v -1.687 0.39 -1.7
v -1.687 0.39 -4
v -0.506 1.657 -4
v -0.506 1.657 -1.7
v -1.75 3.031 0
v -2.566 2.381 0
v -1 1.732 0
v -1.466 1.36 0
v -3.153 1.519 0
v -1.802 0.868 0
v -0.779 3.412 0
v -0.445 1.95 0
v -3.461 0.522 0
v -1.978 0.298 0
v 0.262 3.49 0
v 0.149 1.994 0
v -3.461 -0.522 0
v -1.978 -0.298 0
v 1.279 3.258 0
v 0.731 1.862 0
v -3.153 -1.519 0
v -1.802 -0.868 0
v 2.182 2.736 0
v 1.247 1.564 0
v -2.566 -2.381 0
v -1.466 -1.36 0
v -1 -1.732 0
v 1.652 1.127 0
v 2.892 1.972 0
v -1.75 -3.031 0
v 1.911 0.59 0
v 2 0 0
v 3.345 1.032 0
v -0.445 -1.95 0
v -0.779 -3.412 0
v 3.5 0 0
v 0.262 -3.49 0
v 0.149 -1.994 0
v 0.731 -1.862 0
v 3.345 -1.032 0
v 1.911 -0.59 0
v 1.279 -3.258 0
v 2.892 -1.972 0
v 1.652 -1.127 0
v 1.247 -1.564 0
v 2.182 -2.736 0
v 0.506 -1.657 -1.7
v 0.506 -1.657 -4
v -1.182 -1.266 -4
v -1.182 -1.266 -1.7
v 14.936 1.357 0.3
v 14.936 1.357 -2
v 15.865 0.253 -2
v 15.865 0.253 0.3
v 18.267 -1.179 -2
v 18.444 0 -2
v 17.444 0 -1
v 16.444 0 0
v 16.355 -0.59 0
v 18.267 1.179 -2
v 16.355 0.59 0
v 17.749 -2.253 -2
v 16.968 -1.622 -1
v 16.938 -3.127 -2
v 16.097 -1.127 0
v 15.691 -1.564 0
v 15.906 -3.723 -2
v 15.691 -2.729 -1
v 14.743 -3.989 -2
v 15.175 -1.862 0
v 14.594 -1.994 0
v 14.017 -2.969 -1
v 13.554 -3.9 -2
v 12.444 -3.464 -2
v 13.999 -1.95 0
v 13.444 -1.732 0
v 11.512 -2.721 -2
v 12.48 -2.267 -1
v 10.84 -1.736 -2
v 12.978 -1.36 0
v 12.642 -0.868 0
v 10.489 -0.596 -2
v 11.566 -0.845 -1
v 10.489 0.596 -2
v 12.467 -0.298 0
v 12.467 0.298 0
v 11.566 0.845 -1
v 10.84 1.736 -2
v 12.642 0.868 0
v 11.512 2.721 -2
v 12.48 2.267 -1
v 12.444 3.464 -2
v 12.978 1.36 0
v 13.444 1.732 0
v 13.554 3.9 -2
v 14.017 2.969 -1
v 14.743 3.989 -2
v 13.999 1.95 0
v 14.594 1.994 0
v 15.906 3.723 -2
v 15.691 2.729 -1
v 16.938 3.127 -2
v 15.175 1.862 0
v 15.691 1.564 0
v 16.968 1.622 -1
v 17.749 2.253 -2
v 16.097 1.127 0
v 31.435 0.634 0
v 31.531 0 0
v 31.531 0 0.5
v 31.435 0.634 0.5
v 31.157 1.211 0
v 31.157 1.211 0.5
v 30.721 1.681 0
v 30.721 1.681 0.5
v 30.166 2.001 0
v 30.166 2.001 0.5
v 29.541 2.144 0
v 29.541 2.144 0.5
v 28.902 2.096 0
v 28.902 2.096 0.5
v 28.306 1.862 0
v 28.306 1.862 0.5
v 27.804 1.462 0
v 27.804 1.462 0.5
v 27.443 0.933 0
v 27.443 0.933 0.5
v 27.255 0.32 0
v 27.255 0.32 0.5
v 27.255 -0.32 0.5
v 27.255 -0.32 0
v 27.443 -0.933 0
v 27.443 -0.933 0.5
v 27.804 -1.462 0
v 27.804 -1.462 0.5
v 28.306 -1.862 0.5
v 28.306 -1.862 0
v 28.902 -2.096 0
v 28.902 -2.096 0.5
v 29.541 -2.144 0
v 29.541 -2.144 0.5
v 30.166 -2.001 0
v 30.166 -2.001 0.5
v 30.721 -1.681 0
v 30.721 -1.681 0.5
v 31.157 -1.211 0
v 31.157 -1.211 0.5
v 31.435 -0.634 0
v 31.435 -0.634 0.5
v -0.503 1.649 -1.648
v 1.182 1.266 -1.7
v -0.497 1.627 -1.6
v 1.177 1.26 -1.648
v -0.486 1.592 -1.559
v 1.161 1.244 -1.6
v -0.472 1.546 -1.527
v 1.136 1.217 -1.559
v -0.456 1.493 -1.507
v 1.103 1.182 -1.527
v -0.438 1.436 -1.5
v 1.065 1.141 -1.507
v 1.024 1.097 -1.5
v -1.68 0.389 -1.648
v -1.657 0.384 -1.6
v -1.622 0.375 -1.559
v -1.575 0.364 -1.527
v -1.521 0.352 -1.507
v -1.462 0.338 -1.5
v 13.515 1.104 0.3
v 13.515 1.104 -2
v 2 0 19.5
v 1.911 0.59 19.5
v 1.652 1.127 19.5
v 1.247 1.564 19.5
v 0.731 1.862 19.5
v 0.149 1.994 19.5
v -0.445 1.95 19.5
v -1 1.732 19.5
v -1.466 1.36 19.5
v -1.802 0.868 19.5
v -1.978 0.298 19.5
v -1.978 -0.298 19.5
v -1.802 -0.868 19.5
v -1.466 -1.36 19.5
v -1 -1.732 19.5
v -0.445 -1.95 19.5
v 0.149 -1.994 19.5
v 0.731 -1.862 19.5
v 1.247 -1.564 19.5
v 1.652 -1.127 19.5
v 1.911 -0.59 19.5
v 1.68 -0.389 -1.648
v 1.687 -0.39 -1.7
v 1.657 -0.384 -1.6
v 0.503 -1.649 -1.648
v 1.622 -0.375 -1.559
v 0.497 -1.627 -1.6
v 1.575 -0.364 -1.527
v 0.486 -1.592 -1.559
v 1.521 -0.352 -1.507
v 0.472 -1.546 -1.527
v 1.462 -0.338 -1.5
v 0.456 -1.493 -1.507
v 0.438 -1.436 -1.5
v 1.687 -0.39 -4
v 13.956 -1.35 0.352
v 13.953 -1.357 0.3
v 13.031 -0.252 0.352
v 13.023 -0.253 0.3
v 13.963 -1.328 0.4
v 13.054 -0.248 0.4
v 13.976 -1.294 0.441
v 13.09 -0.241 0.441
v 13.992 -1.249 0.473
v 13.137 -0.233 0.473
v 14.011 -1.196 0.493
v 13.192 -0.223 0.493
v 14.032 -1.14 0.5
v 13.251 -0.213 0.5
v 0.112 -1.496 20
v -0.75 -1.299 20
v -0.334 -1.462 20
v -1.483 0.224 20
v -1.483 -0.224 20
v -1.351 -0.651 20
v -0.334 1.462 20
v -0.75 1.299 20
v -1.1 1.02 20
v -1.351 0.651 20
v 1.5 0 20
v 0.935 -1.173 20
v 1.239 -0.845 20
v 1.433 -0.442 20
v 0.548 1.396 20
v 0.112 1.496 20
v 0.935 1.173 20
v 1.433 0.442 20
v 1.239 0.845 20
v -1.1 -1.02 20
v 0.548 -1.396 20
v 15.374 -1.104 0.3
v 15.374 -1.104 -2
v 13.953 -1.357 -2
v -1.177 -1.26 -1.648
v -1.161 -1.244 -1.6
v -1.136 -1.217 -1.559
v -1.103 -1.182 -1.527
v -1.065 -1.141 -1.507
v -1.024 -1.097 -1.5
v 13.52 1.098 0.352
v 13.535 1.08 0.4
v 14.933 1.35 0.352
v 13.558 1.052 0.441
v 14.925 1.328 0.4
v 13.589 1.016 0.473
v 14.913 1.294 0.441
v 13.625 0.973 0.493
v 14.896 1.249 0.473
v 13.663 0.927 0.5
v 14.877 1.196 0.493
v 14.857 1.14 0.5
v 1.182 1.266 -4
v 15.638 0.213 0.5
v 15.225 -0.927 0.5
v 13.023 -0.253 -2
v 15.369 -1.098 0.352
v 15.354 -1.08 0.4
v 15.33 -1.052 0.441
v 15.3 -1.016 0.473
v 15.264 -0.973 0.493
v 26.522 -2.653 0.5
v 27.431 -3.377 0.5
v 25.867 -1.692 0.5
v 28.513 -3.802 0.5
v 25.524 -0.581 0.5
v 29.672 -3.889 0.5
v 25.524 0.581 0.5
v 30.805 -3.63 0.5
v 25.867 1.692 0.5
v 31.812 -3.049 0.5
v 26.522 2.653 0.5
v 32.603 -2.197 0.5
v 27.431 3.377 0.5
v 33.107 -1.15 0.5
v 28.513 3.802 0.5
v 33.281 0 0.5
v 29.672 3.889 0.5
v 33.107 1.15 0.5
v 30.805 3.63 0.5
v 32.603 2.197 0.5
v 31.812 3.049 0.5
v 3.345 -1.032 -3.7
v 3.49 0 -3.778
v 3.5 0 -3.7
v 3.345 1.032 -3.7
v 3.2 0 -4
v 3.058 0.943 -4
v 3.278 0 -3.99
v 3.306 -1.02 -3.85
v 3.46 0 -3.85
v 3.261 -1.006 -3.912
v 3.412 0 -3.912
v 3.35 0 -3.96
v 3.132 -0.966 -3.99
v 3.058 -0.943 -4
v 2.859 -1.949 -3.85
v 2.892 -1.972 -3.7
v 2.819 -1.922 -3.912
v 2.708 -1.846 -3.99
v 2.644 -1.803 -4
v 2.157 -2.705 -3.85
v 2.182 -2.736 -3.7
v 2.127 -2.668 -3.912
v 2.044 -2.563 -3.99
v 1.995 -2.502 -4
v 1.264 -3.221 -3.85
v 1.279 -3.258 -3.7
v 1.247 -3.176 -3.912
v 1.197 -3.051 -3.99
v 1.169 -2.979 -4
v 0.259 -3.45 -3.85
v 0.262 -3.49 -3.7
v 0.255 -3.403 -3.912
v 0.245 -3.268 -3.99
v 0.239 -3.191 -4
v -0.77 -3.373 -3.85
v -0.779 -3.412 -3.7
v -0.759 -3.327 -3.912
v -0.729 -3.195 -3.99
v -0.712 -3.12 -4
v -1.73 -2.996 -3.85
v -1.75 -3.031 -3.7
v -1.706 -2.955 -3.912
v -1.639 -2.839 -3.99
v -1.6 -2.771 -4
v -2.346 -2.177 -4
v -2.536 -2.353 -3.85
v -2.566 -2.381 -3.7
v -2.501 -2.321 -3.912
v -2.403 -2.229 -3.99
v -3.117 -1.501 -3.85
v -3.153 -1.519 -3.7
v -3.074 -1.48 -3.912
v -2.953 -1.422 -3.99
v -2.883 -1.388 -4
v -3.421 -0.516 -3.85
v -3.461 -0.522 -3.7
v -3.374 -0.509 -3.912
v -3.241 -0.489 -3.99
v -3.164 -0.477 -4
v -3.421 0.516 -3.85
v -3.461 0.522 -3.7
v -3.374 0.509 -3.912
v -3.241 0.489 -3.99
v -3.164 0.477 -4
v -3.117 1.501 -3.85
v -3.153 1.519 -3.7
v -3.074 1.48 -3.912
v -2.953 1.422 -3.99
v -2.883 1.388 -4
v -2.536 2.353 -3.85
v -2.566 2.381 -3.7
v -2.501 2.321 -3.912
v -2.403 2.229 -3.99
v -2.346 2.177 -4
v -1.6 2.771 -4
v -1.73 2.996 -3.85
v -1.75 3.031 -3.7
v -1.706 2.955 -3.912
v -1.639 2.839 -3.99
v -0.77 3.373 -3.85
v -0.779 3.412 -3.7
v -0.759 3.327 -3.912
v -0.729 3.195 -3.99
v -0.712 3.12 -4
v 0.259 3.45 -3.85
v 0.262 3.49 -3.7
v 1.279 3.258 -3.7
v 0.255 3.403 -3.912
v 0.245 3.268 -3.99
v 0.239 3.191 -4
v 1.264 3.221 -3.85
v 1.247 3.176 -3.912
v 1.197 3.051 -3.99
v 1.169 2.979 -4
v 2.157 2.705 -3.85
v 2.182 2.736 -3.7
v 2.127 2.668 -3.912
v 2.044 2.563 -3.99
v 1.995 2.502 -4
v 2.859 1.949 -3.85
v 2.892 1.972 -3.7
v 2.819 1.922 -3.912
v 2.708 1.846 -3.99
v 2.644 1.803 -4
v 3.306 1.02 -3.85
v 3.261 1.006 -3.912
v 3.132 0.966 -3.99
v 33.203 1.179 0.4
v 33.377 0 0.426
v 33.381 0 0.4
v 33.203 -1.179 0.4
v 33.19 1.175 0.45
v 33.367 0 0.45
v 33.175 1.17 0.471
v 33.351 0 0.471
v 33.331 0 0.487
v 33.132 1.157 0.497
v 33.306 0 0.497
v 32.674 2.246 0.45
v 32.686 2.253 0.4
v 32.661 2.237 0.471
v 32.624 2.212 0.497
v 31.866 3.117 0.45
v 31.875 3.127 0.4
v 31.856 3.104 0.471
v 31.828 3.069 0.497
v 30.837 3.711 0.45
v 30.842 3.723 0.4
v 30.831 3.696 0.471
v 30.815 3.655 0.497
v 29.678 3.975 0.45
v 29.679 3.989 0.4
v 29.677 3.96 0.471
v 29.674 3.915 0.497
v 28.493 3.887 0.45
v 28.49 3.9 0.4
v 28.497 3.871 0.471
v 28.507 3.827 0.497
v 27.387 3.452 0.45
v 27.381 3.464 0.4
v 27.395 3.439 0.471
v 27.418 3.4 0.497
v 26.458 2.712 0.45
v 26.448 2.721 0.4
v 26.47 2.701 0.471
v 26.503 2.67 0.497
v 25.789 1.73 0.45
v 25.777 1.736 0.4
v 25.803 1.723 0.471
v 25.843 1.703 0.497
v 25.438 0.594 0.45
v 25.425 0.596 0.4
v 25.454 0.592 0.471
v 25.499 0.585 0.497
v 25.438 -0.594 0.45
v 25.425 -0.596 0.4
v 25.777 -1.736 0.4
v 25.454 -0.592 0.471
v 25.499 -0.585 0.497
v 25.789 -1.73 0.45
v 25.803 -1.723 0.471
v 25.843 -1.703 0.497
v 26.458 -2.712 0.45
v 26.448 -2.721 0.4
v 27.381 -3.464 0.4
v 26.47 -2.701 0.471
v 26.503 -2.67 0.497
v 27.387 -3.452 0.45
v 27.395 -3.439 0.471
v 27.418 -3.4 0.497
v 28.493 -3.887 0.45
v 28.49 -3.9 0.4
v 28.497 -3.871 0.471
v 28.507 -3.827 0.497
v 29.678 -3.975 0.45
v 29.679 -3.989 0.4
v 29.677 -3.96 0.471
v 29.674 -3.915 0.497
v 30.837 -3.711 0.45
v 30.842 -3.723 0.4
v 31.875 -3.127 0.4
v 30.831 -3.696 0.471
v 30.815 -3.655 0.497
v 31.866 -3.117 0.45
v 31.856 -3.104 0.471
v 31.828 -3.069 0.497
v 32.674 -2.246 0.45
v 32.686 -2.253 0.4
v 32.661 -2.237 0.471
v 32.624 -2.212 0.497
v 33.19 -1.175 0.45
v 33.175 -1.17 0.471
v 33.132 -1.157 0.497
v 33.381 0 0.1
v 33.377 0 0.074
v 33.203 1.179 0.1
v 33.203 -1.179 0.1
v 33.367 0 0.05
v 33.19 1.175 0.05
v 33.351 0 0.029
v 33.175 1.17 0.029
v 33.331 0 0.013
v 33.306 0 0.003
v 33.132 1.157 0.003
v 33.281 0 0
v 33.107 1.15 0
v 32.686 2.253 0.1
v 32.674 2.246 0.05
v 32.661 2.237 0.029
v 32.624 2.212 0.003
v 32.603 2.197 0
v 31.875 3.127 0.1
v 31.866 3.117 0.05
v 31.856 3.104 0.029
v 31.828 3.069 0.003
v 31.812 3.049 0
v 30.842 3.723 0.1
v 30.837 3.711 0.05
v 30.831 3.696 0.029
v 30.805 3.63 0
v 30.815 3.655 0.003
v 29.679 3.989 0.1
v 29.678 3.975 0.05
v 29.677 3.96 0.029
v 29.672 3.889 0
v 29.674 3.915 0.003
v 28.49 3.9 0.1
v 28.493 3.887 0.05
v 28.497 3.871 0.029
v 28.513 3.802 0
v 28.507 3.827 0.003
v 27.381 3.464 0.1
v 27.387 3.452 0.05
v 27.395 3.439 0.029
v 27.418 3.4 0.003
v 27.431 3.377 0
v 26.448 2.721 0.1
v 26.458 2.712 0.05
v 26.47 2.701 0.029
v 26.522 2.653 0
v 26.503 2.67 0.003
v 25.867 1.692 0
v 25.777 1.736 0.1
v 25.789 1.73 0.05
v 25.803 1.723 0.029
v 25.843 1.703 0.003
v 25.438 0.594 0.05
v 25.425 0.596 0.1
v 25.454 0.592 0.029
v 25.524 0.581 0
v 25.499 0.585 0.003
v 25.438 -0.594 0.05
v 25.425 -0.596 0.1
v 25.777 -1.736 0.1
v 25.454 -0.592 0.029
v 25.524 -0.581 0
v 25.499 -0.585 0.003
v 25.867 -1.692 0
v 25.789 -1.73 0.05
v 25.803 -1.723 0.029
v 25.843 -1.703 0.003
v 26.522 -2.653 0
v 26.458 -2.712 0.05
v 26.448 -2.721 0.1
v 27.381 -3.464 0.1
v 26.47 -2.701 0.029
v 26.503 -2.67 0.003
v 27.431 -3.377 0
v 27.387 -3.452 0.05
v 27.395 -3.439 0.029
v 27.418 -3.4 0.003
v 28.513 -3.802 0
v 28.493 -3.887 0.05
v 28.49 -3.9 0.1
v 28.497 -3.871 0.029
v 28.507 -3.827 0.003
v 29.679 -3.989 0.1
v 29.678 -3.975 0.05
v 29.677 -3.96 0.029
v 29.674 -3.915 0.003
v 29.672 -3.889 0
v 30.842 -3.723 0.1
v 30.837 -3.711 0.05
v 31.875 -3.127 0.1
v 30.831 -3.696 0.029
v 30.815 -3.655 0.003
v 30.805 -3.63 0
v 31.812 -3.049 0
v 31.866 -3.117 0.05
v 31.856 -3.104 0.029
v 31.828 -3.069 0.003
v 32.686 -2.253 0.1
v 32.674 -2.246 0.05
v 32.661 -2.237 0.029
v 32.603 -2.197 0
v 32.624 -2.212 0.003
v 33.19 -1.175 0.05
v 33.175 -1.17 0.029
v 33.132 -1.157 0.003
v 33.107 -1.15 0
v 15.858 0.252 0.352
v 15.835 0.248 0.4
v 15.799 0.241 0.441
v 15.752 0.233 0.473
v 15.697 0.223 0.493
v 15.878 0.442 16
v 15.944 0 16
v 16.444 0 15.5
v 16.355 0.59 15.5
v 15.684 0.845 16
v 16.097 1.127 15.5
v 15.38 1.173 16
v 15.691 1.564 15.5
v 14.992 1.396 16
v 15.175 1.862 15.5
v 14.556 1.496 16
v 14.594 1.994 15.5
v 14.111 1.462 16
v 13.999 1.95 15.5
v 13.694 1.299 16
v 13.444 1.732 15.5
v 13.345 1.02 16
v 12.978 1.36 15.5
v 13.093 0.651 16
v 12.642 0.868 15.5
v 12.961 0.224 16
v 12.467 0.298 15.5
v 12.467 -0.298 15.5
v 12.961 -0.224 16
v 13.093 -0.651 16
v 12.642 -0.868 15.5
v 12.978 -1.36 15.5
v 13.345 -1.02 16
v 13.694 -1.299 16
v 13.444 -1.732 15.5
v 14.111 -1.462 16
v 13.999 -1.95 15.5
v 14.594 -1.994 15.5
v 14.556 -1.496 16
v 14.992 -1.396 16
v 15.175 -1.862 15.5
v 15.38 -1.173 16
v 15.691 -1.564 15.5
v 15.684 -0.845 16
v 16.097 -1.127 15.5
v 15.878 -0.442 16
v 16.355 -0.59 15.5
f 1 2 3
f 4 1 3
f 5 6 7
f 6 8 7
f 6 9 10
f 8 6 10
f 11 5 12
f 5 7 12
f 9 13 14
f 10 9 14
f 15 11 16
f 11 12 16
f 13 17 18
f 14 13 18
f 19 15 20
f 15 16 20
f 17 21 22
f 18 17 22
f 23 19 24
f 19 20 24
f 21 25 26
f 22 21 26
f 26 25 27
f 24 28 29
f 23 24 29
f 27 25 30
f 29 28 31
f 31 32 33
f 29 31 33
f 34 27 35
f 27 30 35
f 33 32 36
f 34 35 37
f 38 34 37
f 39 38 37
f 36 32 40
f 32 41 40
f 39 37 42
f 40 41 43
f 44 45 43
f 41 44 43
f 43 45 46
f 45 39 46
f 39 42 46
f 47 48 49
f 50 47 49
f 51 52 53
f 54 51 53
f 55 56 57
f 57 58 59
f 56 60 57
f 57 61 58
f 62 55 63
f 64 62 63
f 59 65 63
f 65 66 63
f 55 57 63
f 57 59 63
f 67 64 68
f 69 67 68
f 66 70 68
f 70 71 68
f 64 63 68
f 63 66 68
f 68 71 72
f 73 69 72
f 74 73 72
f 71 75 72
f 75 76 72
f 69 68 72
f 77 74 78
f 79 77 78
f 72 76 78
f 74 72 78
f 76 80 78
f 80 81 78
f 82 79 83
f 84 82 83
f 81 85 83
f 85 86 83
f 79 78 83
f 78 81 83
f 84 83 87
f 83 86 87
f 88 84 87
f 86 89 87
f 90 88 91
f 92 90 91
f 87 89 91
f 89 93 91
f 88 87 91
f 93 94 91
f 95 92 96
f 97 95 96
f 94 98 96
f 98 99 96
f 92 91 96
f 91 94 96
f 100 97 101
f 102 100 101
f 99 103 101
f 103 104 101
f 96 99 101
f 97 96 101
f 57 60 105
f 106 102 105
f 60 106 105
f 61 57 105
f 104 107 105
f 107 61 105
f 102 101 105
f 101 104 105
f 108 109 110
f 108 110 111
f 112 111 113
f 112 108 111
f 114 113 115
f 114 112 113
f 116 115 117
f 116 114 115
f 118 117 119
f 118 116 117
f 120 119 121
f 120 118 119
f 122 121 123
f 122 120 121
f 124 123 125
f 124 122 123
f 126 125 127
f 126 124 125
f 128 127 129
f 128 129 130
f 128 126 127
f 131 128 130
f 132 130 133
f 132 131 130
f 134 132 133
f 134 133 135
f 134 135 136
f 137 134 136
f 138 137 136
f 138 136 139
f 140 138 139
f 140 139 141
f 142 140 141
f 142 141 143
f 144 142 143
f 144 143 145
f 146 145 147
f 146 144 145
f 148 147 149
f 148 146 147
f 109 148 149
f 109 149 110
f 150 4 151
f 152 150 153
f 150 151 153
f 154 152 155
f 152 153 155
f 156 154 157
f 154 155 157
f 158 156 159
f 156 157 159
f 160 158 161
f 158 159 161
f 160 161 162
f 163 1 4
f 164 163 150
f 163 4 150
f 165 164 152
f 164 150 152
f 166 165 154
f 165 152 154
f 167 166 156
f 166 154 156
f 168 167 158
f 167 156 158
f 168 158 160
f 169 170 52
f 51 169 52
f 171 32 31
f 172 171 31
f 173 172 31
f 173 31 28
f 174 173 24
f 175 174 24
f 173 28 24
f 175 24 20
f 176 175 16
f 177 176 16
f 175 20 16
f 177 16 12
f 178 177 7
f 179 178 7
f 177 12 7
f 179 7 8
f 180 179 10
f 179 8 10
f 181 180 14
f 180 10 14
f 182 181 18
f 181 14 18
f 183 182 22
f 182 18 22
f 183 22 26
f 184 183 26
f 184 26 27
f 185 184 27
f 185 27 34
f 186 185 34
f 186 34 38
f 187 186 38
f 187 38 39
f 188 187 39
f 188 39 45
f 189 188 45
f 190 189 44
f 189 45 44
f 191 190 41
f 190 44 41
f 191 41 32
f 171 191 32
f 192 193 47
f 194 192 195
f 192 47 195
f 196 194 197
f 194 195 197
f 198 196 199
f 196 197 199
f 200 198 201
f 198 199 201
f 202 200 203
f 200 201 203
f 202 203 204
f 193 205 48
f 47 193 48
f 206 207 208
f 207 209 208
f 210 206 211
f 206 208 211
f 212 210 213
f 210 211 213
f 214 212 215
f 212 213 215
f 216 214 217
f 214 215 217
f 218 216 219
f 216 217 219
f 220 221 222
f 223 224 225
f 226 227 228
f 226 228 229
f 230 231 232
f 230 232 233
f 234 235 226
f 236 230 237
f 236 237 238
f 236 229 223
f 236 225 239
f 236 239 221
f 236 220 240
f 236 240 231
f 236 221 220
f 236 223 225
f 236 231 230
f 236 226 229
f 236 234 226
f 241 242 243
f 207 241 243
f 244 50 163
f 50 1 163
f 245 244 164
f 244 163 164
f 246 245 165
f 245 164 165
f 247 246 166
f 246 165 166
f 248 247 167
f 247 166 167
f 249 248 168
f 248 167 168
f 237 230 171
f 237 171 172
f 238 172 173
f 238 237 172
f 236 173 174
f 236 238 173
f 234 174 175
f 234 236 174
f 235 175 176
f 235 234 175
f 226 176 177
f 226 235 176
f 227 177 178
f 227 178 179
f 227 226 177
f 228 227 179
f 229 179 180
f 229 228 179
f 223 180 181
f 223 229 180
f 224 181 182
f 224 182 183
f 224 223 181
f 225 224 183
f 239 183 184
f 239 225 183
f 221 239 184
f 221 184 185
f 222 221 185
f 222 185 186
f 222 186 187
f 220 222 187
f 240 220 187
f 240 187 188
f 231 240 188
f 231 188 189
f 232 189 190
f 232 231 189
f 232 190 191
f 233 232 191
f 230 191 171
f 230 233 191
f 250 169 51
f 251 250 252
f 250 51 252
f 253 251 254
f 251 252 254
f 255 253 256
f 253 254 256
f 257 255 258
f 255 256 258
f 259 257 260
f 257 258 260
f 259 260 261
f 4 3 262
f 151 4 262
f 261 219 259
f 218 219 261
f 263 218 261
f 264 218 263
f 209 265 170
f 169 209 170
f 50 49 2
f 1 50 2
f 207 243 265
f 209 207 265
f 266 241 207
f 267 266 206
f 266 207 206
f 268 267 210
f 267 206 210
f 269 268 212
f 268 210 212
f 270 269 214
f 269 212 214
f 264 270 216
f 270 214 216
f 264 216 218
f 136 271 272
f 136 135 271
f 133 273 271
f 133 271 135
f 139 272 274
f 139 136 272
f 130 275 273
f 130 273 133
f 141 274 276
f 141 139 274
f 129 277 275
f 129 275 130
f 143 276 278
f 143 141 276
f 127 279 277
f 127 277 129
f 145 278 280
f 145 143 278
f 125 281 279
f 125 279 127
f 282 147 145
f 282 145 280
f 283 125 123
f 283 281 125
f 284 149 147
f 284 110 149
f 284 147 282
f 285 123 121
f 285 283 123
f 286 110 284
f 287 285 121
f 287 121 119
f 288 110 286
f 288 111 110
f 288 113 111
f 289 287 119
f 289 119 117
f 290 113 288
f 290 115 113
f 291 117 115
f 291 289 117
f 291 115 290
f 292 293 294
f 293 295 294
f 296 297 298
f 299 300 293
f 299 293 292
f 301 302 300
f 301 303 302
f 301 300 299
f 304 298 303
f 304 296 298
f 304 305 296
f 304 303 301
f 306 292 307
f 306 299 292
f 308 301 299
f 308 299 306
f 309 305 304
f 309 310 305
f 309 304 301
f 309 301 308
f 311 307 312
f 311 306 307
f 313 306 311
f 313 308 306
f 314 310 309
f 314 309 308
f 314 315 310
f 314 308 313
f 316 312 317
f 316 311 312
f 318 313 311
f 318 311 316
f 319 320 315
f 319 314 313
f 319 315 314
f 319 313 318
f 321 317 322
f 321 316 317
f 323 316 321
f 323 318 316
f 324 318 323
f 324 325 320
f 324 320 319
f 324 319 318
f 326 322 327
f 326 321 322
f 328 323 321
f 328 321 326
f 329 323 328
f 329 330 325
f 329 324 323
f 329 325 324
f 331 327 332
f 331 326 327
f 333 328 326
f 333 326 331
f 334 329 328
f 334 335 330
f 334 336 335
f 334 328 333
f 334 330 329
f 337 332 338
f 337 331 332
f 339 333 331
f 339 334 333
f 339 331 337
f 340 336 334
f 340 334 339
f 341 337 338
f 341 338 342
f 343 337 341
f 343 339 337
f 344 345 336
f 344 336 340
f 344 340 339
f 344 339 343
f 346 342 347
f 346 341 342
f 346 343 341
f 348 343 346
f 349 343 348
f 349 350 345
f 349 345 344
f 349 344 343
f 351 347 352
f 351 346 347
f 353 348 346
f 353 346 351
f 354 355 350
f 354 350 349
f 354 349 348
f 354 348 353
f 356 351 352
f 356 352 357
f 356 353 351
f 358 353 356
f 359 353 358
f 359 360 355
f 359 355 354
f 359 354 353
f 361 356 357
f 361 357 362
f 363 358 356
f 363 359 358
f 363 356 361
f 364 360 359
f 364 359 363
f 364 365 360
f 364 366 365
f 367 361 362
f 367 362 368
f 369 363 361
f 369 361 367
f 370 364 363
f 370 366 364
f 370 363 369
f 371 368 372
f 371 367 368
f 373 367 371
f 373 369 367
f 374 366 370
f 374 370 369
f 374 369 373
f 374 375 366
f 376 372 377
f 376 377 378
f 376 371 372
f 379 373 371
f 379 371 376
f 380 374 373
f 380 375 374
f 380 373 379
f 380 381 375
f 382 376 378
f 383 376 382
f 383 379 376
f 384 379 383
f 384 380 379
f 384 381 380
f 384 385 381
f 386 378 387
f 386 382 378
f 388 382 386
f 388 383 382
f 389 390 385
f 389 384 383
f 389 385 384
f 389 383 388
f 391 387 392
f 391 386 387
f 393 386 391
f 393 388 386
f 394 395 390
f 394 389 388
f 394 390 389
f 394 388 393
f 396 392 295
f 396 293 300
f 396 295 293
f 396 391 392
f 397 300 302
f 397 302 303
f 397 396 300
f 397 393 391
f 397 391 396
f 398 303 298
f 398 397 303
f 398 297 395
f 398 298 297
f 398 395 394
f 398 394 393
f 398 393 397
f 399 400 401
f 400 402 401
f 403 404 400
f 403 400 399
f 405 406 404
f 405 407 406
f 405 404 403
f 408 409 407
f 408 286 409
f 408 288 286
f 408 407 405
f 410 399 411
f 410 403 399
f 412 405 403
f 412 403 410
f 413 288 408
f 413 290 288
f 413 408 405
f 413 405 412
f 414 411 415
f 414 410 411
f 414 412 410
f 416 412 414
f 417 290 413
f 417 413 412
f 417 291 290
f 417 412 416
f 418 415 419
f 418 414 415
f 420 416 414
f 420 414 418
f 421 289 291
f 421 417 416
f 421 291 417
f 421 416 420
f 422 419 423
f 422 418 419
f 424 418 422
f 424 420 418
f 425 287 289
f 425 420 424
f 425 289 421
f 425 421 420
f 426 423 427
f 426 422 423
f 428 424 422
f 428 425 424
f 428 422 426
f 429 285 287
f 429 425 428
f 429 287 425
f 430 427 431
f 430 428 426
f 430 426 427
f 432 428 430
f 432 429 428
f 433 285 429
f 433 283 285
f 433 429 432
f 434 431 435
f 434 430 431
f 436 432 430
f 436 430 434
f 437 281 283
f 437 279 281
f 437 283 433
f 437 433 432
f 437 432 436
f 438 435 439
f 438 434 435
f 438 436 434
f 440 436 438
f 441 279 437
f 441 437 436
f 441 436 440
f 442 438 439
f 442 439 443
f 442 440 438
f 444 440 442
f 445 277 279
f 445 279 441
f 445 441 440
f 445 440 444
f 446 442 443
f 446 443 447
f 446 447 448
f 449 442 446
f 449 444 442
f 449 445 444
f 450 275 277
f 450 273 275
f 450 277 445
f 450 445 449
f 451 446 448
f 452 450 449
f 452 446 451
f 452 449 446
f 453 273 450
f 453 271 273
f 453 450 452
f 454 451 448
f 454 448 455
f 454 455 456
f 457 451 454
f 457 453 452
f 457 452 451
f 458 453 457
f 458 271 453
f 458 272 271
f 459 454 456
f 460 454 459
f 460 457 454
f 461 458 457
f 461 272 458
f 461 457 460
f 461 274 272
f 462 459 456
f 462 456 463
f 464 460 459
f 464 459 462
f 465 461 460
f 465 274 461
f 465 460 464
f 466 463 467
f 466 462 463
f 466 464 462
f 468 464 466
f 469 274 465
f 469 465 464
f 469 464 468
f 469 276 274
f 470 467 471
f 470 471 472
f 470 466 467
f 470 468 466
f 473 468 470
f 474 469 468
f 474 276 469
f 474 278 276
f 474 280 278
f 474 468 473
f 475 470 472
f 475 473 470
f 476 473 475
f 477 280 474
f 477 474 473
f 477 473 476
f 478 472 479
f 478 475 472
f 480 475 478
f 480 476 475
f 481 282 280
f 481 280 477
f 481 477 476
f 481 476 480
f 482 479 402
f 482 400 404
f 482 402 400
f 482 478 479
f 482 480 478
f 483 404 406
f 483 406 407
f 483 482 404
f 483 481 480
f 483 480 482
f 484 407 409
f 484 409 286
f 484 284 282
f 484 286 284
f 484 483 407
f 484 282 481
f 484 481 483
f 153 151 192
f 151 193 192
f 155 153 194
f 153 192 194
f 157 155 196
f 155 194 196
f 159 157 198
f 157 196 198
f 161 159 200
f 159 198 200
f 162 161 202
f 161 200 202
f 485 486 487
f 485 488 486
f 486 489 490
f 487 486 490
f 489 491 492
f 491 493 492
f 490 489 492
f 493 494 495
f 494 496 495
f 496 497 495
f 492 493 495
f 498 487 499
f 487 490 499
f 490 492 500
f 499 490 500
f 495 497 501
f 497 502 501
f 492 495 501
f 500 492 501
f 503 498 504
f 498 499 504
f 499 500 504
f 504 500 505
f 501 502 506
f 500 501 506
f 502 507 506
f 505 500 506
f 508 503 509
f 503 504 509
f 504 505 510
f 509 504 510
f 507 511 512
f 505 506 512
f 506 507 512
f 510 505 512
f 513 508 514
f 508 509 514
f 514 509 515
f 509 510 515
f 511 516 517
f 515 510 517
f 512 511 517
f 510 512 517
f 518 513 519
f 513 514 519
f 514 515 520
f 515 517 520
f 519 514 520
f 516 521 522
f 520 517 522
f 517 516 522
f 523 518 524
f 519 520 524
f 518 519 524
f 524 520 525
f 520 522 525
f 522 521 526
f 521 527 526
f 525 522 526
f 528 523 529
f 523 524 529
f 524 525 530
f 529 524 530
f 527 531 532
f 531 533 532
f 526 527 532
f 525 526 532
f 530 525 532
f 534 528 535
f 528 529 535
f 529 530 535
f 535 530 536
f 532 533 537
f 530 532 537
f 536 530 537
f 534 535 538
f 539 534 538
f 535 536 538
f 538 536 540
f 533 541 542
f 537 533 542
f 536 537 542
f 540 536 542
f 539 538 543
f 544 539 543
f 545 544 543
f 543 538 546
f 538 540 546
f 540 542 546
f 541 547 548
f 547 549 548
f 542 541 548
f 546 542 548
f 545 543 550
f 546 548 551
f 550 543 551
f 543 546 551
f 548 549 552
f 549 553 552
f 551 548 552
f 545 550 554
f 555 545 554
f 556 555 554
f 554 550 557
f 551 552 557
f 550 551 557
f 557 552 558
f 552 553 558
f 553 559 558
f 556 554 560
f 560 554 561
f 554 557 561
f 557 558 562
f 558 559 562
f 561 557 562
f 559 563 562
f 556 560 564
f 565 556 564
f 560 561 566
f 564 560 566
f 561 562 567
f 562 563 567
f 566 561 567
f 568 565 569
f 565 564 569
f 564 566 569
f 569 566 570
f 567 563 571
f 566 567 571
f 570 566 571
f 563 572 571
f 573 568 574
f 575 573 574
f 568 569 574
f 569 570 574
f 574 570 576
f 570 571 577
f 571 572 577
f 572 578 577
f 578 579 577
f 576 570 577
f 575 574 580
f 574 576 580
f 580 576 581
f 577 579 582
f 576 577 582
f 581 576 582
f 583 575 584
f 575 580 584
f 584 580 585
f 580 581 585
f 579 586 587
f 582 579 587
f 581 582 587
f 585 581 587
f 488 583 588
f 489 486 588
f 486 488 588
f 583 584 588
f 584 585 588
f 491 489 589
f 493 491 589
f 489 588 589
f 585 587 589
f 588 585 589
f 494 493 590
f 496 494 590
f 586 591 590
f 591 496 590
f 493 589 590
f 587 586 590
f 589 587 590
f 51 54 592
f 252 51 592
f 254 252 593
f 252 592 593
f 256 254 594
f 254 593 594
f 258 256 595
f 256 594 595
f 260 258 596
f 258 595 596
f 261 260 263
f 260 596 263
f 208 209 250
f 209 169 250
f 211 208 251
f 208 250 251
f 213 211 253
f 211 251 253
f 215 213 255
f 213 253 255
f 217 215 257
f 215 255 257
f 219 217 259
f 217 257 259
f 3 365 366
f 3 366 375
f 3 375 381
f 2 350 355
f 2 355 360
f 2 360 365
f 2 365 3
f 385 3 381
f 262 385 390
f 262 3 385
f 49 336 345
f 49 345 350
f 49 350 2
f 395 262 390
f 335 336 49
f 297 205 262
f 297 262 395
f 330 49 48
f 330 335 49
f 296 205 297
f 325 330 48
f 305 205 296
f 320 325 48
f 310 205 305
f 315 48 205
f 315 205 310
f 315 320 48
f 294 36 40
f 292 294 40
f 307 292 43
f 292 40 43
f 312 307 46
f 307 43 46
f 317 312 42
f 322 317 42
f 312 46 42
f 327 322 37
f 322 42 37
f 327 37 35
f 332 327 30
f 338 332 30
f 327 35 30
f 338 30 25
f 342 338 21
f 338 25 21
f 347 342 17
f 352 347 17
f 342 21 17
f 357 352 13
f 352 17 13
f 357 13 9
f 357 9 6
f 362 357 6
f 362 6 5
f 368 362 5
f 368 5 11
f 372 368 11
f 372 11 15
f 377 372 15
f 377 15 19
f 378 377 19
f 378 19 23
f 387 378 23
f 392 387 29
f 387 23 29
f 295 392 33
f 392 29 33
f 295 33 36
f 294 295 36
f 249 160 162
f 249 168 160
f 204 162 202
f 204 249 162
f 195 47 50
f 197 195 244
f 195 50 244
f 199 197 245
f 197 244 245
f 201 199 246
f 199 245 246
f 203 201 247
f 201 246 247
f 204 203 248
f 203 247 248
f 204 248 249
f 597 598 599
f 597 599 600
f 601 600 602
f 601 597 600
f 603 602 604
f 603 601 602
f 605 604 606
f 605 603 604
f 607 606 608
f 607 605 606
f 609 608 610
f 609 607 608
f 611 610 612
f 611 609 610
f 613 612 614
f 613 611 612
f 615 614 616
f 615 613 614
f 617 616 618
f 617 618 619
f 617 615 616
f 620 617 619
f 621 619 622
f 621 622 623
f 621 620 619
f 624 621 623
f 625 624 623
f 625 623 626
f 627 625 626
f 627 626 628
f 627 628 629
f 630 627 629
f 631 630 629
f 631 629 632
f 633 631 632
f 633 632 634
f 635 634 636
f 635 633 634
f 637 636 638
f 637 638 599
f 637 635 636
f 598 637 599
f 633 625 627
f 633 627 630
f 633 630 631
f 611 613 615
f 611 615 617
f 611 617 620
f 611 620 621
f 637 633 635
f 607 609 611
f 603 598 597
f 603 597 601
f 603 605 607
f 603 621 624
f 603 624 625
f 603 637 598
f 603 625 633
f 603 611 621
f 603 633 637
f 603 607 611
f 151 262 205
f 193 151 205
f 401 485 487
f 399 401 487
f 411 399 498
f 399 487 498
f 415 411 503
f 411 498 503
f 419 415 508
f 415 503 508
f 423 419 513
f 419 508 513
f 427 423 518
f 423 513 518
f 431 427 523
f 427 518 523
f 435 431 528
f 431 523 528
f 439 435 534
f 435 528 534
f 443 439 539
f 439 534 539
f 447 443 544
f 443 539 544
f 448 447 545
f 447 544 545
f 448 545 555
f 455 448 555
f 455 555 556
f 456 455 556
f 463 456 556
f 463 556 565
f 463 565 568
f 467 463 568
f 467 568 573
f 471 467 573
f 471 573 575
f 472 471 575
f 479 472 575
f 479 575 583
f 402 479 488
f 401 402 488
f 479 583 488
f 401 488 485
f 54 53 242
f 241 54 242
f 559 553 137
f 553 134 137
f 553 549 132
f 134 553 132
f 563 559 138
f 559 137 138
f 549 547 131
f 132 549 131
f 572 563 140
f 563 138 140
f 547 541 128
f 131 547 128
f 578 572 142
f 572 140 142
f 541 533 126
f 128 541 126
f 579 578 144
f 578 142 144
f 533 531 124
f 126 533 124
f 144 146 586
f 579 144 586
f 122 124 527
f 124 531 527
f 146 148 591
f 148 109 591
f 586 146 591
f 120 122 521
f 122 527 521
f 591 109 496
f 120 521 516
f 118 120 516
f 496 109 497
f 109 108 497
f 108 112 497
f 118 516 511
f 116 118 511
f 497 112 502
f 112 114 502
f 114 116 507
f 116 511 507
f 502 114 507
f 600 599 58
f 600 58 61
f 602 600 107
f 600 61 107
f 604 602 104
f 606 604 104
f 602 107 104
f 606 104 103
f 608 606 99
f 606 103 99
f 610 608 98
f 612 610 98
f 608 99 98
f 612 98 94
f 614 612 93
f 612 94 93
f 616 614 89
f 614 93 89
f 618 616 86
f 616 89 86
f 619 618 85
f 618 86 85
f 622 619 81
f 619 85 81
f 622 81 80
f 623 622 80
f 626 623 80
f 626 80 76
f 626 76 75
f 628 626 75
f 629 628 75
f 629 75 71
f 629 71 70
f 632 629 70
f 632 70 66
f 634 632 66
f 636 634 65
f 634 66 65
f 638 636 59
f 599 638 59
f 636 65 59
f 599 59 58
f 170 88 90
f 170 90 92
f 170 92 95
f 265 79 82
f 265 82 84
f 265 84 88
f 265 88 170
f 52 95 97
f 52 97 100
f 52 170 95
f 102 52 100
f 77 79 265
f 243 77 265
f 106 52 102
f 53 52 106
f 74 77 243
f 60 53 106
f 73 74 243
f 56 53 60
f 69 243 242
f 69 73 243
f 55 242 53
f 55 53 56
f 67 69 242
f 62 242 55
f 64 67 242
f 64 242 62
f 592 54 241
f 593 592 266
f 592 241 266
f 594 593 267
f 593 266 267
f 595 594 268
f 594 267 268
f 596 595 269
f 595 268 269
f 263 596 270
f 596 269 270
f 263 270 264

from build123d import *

# Parameters (mm, degrees)
F0_R      = 2
F1_DEPTH  = 20
F2_SIZE   = 0.5
F3_R      = 3.5
F4_DEPTH  = 4
F5_R      = 0.3
F7_DEPTH  = 2.5
F8_R      = 0.2
F9_R      = 2
F10_DEPTH = 16
F11_SIZE  = 0.5
F12_R     = 4
F13_DEPTH = 2
F15_DEPTH = 2.5
F16_R     = 0.2
F17_SIZE  = 1.99999
F18_R     = 4
F18_R_2   = 2.15
F19_DEPTH = 0.5
F20_R     = 0.1


# Not quite as in the source:
# - a fillet or chamfer is up to 0.001 mm smaller than in the source, because OpenCascade refuses the exact size


with BuildPart() as f1:
    # F0 (on Top) → F1 (new body)
    with BuildSketch(Plane.XY):
        Circle(F0_R)
    extrude(amount=F1_DEPTH)

    # F2
    f2_edges = [f1.edges().sort_by_distance(p)[0] for p in [
        (-2, 0, 20),
    ]]
    chamfer(f2_edges, length=F2_SIZE)

    # F3 (on face) → F4 (join)
    with BuildSketch(Plane(origin=(0, 0, 0), x_dir=(1, 0, 0), z_dir=(0, 0, -1))):
        Circle(F3_R)
    extrude(amount=F4_DEPTH)

    # F5
    f5_edges = [f1.edges().sort_by_distance(p)[0] for p in [
        (-3.5, 0, -4),
    ]]
    fillet(f5_edges, radius=F5_R)

    # F6 (on face) → F7 (cut)
    with BuildSketch(Plane(origin=(0, 0, -4), x_dir=(1, 0, 0), z_dir=(0, 0, -1))):
        Polygon((1.6874600466, 0.3904850718), (0.5055600313, 1.6566258041), (-1.1819000152, 1.2661407323), (-1.6874600466, -0.3904850718), (-0.5055600313, -1.6566258041), (1.1819000152, -1.2661407323), align=None)
    extrude(amount=-F7_DEPTH, mode=Mode.SUBTRACT)

    # F8
    f8_edges = [f1.edges().sort_by_distance(p)[0] for p in [
        (0.33817, 1.461383, -1.5),
        (1.43468, 0.437828, -1.5),
        (1.09651, -1.023555, -1.5),
        (-0.33817, -1.461383, -1.5),
        (-1.43468, -0.437828, -1.5),
        (-1.09651, 1.023555, -1.5),
    ]]
    fillet(f8_edges, radius=F8_R)


with BuildPart() as f10:
    # F9 (on Top) → F10 (new body)
    with BuildSketch(Plane.XY):
        with Locations((14.4443198481, 0)):
            Circle(F9_R)
    extrude(amount=F10_DEPTH)

    # F11
    f11_edges = [f10.edges().sort_by_distance(p)[0] for p in [
        (12.44432, 0, 16),
    ]]
    chamfer(f11_edges, length=F11_SIZE)

    # F12 (on face) → F13 (join)
    with BuildSketch(Plane(origin=(0, 0, 0), x_dir=(1, 0, 0), z_dir=(0, 0, -1))):
        with Locations((14.4443198481, 0)):
            Circle(F12_R)
    extrude(amount=F13_DEPTH)

    # F14 (on face) → F15 (cut)
    with BuildSketch(Plane(origin=(0, 0, -2), x_dir=(1, 0, 0), z_dir=(0, 0, -1))):
        Polygon((14.9357198231, -1.3571512067), (15.8653472574, -0.2530107417), (15.3739472825, 1.1041404651), (13.9529198732, 1.3571512067), (13.0232924389, 0.2530107417), (13.5146924138, -1.1041404651), align=None)
    extrude(amount=-F15_DEPTH, mode=Mode.SUBTRACT)

    # F16
    f16_edges = [f10.edges().sort_by_distance(p)[0] for p in [
        (14.225206, 1.230646, 0.5),
        (15.400534, 0.805081, 0.5),
        (15.619647, -0.425565, 0.5),
        (14.663434, -1.230646, 0.5),
        (13.488106, -0.805081, 0.5),
        (13.268992, 0.425565, 0.5),
    ]]
    fillet(f16_edges, radius=F16_R)

    # F17 (size 2 in the source; OpenCascade refuses exactly that, so slightly less here)
    f17_edges = [f10.edges().sort_by_distance(p)[0] for p in [
        (10.44432, 0, 0),
    ]]
    chamfer(f17_edges, length=F17_SIZE)


with BuildPart() as f19:
    # F18 (on Top) → F19 (new body)
    with BuildSketch(Plane.XY):
        with Locations((29.3805521813, 0)):
            Circle(F18_R)
        with Locations((29.3805521813, 0)):
            Circle(F18_R_2, mode=Mode.SUBTRACT)
    extrude(amount=F19_DEPTH)

    # F20
    f20_edges = [f19.edges().sort_by_distance(p)[0] for p in [
        (25.380552, 0, 0),
        (25.380552, 0, 0.5),
    ]]
    fillet(f20_edges, radius=F20_R)


solid = Compound([f1.part, f10.part, f19.part])
